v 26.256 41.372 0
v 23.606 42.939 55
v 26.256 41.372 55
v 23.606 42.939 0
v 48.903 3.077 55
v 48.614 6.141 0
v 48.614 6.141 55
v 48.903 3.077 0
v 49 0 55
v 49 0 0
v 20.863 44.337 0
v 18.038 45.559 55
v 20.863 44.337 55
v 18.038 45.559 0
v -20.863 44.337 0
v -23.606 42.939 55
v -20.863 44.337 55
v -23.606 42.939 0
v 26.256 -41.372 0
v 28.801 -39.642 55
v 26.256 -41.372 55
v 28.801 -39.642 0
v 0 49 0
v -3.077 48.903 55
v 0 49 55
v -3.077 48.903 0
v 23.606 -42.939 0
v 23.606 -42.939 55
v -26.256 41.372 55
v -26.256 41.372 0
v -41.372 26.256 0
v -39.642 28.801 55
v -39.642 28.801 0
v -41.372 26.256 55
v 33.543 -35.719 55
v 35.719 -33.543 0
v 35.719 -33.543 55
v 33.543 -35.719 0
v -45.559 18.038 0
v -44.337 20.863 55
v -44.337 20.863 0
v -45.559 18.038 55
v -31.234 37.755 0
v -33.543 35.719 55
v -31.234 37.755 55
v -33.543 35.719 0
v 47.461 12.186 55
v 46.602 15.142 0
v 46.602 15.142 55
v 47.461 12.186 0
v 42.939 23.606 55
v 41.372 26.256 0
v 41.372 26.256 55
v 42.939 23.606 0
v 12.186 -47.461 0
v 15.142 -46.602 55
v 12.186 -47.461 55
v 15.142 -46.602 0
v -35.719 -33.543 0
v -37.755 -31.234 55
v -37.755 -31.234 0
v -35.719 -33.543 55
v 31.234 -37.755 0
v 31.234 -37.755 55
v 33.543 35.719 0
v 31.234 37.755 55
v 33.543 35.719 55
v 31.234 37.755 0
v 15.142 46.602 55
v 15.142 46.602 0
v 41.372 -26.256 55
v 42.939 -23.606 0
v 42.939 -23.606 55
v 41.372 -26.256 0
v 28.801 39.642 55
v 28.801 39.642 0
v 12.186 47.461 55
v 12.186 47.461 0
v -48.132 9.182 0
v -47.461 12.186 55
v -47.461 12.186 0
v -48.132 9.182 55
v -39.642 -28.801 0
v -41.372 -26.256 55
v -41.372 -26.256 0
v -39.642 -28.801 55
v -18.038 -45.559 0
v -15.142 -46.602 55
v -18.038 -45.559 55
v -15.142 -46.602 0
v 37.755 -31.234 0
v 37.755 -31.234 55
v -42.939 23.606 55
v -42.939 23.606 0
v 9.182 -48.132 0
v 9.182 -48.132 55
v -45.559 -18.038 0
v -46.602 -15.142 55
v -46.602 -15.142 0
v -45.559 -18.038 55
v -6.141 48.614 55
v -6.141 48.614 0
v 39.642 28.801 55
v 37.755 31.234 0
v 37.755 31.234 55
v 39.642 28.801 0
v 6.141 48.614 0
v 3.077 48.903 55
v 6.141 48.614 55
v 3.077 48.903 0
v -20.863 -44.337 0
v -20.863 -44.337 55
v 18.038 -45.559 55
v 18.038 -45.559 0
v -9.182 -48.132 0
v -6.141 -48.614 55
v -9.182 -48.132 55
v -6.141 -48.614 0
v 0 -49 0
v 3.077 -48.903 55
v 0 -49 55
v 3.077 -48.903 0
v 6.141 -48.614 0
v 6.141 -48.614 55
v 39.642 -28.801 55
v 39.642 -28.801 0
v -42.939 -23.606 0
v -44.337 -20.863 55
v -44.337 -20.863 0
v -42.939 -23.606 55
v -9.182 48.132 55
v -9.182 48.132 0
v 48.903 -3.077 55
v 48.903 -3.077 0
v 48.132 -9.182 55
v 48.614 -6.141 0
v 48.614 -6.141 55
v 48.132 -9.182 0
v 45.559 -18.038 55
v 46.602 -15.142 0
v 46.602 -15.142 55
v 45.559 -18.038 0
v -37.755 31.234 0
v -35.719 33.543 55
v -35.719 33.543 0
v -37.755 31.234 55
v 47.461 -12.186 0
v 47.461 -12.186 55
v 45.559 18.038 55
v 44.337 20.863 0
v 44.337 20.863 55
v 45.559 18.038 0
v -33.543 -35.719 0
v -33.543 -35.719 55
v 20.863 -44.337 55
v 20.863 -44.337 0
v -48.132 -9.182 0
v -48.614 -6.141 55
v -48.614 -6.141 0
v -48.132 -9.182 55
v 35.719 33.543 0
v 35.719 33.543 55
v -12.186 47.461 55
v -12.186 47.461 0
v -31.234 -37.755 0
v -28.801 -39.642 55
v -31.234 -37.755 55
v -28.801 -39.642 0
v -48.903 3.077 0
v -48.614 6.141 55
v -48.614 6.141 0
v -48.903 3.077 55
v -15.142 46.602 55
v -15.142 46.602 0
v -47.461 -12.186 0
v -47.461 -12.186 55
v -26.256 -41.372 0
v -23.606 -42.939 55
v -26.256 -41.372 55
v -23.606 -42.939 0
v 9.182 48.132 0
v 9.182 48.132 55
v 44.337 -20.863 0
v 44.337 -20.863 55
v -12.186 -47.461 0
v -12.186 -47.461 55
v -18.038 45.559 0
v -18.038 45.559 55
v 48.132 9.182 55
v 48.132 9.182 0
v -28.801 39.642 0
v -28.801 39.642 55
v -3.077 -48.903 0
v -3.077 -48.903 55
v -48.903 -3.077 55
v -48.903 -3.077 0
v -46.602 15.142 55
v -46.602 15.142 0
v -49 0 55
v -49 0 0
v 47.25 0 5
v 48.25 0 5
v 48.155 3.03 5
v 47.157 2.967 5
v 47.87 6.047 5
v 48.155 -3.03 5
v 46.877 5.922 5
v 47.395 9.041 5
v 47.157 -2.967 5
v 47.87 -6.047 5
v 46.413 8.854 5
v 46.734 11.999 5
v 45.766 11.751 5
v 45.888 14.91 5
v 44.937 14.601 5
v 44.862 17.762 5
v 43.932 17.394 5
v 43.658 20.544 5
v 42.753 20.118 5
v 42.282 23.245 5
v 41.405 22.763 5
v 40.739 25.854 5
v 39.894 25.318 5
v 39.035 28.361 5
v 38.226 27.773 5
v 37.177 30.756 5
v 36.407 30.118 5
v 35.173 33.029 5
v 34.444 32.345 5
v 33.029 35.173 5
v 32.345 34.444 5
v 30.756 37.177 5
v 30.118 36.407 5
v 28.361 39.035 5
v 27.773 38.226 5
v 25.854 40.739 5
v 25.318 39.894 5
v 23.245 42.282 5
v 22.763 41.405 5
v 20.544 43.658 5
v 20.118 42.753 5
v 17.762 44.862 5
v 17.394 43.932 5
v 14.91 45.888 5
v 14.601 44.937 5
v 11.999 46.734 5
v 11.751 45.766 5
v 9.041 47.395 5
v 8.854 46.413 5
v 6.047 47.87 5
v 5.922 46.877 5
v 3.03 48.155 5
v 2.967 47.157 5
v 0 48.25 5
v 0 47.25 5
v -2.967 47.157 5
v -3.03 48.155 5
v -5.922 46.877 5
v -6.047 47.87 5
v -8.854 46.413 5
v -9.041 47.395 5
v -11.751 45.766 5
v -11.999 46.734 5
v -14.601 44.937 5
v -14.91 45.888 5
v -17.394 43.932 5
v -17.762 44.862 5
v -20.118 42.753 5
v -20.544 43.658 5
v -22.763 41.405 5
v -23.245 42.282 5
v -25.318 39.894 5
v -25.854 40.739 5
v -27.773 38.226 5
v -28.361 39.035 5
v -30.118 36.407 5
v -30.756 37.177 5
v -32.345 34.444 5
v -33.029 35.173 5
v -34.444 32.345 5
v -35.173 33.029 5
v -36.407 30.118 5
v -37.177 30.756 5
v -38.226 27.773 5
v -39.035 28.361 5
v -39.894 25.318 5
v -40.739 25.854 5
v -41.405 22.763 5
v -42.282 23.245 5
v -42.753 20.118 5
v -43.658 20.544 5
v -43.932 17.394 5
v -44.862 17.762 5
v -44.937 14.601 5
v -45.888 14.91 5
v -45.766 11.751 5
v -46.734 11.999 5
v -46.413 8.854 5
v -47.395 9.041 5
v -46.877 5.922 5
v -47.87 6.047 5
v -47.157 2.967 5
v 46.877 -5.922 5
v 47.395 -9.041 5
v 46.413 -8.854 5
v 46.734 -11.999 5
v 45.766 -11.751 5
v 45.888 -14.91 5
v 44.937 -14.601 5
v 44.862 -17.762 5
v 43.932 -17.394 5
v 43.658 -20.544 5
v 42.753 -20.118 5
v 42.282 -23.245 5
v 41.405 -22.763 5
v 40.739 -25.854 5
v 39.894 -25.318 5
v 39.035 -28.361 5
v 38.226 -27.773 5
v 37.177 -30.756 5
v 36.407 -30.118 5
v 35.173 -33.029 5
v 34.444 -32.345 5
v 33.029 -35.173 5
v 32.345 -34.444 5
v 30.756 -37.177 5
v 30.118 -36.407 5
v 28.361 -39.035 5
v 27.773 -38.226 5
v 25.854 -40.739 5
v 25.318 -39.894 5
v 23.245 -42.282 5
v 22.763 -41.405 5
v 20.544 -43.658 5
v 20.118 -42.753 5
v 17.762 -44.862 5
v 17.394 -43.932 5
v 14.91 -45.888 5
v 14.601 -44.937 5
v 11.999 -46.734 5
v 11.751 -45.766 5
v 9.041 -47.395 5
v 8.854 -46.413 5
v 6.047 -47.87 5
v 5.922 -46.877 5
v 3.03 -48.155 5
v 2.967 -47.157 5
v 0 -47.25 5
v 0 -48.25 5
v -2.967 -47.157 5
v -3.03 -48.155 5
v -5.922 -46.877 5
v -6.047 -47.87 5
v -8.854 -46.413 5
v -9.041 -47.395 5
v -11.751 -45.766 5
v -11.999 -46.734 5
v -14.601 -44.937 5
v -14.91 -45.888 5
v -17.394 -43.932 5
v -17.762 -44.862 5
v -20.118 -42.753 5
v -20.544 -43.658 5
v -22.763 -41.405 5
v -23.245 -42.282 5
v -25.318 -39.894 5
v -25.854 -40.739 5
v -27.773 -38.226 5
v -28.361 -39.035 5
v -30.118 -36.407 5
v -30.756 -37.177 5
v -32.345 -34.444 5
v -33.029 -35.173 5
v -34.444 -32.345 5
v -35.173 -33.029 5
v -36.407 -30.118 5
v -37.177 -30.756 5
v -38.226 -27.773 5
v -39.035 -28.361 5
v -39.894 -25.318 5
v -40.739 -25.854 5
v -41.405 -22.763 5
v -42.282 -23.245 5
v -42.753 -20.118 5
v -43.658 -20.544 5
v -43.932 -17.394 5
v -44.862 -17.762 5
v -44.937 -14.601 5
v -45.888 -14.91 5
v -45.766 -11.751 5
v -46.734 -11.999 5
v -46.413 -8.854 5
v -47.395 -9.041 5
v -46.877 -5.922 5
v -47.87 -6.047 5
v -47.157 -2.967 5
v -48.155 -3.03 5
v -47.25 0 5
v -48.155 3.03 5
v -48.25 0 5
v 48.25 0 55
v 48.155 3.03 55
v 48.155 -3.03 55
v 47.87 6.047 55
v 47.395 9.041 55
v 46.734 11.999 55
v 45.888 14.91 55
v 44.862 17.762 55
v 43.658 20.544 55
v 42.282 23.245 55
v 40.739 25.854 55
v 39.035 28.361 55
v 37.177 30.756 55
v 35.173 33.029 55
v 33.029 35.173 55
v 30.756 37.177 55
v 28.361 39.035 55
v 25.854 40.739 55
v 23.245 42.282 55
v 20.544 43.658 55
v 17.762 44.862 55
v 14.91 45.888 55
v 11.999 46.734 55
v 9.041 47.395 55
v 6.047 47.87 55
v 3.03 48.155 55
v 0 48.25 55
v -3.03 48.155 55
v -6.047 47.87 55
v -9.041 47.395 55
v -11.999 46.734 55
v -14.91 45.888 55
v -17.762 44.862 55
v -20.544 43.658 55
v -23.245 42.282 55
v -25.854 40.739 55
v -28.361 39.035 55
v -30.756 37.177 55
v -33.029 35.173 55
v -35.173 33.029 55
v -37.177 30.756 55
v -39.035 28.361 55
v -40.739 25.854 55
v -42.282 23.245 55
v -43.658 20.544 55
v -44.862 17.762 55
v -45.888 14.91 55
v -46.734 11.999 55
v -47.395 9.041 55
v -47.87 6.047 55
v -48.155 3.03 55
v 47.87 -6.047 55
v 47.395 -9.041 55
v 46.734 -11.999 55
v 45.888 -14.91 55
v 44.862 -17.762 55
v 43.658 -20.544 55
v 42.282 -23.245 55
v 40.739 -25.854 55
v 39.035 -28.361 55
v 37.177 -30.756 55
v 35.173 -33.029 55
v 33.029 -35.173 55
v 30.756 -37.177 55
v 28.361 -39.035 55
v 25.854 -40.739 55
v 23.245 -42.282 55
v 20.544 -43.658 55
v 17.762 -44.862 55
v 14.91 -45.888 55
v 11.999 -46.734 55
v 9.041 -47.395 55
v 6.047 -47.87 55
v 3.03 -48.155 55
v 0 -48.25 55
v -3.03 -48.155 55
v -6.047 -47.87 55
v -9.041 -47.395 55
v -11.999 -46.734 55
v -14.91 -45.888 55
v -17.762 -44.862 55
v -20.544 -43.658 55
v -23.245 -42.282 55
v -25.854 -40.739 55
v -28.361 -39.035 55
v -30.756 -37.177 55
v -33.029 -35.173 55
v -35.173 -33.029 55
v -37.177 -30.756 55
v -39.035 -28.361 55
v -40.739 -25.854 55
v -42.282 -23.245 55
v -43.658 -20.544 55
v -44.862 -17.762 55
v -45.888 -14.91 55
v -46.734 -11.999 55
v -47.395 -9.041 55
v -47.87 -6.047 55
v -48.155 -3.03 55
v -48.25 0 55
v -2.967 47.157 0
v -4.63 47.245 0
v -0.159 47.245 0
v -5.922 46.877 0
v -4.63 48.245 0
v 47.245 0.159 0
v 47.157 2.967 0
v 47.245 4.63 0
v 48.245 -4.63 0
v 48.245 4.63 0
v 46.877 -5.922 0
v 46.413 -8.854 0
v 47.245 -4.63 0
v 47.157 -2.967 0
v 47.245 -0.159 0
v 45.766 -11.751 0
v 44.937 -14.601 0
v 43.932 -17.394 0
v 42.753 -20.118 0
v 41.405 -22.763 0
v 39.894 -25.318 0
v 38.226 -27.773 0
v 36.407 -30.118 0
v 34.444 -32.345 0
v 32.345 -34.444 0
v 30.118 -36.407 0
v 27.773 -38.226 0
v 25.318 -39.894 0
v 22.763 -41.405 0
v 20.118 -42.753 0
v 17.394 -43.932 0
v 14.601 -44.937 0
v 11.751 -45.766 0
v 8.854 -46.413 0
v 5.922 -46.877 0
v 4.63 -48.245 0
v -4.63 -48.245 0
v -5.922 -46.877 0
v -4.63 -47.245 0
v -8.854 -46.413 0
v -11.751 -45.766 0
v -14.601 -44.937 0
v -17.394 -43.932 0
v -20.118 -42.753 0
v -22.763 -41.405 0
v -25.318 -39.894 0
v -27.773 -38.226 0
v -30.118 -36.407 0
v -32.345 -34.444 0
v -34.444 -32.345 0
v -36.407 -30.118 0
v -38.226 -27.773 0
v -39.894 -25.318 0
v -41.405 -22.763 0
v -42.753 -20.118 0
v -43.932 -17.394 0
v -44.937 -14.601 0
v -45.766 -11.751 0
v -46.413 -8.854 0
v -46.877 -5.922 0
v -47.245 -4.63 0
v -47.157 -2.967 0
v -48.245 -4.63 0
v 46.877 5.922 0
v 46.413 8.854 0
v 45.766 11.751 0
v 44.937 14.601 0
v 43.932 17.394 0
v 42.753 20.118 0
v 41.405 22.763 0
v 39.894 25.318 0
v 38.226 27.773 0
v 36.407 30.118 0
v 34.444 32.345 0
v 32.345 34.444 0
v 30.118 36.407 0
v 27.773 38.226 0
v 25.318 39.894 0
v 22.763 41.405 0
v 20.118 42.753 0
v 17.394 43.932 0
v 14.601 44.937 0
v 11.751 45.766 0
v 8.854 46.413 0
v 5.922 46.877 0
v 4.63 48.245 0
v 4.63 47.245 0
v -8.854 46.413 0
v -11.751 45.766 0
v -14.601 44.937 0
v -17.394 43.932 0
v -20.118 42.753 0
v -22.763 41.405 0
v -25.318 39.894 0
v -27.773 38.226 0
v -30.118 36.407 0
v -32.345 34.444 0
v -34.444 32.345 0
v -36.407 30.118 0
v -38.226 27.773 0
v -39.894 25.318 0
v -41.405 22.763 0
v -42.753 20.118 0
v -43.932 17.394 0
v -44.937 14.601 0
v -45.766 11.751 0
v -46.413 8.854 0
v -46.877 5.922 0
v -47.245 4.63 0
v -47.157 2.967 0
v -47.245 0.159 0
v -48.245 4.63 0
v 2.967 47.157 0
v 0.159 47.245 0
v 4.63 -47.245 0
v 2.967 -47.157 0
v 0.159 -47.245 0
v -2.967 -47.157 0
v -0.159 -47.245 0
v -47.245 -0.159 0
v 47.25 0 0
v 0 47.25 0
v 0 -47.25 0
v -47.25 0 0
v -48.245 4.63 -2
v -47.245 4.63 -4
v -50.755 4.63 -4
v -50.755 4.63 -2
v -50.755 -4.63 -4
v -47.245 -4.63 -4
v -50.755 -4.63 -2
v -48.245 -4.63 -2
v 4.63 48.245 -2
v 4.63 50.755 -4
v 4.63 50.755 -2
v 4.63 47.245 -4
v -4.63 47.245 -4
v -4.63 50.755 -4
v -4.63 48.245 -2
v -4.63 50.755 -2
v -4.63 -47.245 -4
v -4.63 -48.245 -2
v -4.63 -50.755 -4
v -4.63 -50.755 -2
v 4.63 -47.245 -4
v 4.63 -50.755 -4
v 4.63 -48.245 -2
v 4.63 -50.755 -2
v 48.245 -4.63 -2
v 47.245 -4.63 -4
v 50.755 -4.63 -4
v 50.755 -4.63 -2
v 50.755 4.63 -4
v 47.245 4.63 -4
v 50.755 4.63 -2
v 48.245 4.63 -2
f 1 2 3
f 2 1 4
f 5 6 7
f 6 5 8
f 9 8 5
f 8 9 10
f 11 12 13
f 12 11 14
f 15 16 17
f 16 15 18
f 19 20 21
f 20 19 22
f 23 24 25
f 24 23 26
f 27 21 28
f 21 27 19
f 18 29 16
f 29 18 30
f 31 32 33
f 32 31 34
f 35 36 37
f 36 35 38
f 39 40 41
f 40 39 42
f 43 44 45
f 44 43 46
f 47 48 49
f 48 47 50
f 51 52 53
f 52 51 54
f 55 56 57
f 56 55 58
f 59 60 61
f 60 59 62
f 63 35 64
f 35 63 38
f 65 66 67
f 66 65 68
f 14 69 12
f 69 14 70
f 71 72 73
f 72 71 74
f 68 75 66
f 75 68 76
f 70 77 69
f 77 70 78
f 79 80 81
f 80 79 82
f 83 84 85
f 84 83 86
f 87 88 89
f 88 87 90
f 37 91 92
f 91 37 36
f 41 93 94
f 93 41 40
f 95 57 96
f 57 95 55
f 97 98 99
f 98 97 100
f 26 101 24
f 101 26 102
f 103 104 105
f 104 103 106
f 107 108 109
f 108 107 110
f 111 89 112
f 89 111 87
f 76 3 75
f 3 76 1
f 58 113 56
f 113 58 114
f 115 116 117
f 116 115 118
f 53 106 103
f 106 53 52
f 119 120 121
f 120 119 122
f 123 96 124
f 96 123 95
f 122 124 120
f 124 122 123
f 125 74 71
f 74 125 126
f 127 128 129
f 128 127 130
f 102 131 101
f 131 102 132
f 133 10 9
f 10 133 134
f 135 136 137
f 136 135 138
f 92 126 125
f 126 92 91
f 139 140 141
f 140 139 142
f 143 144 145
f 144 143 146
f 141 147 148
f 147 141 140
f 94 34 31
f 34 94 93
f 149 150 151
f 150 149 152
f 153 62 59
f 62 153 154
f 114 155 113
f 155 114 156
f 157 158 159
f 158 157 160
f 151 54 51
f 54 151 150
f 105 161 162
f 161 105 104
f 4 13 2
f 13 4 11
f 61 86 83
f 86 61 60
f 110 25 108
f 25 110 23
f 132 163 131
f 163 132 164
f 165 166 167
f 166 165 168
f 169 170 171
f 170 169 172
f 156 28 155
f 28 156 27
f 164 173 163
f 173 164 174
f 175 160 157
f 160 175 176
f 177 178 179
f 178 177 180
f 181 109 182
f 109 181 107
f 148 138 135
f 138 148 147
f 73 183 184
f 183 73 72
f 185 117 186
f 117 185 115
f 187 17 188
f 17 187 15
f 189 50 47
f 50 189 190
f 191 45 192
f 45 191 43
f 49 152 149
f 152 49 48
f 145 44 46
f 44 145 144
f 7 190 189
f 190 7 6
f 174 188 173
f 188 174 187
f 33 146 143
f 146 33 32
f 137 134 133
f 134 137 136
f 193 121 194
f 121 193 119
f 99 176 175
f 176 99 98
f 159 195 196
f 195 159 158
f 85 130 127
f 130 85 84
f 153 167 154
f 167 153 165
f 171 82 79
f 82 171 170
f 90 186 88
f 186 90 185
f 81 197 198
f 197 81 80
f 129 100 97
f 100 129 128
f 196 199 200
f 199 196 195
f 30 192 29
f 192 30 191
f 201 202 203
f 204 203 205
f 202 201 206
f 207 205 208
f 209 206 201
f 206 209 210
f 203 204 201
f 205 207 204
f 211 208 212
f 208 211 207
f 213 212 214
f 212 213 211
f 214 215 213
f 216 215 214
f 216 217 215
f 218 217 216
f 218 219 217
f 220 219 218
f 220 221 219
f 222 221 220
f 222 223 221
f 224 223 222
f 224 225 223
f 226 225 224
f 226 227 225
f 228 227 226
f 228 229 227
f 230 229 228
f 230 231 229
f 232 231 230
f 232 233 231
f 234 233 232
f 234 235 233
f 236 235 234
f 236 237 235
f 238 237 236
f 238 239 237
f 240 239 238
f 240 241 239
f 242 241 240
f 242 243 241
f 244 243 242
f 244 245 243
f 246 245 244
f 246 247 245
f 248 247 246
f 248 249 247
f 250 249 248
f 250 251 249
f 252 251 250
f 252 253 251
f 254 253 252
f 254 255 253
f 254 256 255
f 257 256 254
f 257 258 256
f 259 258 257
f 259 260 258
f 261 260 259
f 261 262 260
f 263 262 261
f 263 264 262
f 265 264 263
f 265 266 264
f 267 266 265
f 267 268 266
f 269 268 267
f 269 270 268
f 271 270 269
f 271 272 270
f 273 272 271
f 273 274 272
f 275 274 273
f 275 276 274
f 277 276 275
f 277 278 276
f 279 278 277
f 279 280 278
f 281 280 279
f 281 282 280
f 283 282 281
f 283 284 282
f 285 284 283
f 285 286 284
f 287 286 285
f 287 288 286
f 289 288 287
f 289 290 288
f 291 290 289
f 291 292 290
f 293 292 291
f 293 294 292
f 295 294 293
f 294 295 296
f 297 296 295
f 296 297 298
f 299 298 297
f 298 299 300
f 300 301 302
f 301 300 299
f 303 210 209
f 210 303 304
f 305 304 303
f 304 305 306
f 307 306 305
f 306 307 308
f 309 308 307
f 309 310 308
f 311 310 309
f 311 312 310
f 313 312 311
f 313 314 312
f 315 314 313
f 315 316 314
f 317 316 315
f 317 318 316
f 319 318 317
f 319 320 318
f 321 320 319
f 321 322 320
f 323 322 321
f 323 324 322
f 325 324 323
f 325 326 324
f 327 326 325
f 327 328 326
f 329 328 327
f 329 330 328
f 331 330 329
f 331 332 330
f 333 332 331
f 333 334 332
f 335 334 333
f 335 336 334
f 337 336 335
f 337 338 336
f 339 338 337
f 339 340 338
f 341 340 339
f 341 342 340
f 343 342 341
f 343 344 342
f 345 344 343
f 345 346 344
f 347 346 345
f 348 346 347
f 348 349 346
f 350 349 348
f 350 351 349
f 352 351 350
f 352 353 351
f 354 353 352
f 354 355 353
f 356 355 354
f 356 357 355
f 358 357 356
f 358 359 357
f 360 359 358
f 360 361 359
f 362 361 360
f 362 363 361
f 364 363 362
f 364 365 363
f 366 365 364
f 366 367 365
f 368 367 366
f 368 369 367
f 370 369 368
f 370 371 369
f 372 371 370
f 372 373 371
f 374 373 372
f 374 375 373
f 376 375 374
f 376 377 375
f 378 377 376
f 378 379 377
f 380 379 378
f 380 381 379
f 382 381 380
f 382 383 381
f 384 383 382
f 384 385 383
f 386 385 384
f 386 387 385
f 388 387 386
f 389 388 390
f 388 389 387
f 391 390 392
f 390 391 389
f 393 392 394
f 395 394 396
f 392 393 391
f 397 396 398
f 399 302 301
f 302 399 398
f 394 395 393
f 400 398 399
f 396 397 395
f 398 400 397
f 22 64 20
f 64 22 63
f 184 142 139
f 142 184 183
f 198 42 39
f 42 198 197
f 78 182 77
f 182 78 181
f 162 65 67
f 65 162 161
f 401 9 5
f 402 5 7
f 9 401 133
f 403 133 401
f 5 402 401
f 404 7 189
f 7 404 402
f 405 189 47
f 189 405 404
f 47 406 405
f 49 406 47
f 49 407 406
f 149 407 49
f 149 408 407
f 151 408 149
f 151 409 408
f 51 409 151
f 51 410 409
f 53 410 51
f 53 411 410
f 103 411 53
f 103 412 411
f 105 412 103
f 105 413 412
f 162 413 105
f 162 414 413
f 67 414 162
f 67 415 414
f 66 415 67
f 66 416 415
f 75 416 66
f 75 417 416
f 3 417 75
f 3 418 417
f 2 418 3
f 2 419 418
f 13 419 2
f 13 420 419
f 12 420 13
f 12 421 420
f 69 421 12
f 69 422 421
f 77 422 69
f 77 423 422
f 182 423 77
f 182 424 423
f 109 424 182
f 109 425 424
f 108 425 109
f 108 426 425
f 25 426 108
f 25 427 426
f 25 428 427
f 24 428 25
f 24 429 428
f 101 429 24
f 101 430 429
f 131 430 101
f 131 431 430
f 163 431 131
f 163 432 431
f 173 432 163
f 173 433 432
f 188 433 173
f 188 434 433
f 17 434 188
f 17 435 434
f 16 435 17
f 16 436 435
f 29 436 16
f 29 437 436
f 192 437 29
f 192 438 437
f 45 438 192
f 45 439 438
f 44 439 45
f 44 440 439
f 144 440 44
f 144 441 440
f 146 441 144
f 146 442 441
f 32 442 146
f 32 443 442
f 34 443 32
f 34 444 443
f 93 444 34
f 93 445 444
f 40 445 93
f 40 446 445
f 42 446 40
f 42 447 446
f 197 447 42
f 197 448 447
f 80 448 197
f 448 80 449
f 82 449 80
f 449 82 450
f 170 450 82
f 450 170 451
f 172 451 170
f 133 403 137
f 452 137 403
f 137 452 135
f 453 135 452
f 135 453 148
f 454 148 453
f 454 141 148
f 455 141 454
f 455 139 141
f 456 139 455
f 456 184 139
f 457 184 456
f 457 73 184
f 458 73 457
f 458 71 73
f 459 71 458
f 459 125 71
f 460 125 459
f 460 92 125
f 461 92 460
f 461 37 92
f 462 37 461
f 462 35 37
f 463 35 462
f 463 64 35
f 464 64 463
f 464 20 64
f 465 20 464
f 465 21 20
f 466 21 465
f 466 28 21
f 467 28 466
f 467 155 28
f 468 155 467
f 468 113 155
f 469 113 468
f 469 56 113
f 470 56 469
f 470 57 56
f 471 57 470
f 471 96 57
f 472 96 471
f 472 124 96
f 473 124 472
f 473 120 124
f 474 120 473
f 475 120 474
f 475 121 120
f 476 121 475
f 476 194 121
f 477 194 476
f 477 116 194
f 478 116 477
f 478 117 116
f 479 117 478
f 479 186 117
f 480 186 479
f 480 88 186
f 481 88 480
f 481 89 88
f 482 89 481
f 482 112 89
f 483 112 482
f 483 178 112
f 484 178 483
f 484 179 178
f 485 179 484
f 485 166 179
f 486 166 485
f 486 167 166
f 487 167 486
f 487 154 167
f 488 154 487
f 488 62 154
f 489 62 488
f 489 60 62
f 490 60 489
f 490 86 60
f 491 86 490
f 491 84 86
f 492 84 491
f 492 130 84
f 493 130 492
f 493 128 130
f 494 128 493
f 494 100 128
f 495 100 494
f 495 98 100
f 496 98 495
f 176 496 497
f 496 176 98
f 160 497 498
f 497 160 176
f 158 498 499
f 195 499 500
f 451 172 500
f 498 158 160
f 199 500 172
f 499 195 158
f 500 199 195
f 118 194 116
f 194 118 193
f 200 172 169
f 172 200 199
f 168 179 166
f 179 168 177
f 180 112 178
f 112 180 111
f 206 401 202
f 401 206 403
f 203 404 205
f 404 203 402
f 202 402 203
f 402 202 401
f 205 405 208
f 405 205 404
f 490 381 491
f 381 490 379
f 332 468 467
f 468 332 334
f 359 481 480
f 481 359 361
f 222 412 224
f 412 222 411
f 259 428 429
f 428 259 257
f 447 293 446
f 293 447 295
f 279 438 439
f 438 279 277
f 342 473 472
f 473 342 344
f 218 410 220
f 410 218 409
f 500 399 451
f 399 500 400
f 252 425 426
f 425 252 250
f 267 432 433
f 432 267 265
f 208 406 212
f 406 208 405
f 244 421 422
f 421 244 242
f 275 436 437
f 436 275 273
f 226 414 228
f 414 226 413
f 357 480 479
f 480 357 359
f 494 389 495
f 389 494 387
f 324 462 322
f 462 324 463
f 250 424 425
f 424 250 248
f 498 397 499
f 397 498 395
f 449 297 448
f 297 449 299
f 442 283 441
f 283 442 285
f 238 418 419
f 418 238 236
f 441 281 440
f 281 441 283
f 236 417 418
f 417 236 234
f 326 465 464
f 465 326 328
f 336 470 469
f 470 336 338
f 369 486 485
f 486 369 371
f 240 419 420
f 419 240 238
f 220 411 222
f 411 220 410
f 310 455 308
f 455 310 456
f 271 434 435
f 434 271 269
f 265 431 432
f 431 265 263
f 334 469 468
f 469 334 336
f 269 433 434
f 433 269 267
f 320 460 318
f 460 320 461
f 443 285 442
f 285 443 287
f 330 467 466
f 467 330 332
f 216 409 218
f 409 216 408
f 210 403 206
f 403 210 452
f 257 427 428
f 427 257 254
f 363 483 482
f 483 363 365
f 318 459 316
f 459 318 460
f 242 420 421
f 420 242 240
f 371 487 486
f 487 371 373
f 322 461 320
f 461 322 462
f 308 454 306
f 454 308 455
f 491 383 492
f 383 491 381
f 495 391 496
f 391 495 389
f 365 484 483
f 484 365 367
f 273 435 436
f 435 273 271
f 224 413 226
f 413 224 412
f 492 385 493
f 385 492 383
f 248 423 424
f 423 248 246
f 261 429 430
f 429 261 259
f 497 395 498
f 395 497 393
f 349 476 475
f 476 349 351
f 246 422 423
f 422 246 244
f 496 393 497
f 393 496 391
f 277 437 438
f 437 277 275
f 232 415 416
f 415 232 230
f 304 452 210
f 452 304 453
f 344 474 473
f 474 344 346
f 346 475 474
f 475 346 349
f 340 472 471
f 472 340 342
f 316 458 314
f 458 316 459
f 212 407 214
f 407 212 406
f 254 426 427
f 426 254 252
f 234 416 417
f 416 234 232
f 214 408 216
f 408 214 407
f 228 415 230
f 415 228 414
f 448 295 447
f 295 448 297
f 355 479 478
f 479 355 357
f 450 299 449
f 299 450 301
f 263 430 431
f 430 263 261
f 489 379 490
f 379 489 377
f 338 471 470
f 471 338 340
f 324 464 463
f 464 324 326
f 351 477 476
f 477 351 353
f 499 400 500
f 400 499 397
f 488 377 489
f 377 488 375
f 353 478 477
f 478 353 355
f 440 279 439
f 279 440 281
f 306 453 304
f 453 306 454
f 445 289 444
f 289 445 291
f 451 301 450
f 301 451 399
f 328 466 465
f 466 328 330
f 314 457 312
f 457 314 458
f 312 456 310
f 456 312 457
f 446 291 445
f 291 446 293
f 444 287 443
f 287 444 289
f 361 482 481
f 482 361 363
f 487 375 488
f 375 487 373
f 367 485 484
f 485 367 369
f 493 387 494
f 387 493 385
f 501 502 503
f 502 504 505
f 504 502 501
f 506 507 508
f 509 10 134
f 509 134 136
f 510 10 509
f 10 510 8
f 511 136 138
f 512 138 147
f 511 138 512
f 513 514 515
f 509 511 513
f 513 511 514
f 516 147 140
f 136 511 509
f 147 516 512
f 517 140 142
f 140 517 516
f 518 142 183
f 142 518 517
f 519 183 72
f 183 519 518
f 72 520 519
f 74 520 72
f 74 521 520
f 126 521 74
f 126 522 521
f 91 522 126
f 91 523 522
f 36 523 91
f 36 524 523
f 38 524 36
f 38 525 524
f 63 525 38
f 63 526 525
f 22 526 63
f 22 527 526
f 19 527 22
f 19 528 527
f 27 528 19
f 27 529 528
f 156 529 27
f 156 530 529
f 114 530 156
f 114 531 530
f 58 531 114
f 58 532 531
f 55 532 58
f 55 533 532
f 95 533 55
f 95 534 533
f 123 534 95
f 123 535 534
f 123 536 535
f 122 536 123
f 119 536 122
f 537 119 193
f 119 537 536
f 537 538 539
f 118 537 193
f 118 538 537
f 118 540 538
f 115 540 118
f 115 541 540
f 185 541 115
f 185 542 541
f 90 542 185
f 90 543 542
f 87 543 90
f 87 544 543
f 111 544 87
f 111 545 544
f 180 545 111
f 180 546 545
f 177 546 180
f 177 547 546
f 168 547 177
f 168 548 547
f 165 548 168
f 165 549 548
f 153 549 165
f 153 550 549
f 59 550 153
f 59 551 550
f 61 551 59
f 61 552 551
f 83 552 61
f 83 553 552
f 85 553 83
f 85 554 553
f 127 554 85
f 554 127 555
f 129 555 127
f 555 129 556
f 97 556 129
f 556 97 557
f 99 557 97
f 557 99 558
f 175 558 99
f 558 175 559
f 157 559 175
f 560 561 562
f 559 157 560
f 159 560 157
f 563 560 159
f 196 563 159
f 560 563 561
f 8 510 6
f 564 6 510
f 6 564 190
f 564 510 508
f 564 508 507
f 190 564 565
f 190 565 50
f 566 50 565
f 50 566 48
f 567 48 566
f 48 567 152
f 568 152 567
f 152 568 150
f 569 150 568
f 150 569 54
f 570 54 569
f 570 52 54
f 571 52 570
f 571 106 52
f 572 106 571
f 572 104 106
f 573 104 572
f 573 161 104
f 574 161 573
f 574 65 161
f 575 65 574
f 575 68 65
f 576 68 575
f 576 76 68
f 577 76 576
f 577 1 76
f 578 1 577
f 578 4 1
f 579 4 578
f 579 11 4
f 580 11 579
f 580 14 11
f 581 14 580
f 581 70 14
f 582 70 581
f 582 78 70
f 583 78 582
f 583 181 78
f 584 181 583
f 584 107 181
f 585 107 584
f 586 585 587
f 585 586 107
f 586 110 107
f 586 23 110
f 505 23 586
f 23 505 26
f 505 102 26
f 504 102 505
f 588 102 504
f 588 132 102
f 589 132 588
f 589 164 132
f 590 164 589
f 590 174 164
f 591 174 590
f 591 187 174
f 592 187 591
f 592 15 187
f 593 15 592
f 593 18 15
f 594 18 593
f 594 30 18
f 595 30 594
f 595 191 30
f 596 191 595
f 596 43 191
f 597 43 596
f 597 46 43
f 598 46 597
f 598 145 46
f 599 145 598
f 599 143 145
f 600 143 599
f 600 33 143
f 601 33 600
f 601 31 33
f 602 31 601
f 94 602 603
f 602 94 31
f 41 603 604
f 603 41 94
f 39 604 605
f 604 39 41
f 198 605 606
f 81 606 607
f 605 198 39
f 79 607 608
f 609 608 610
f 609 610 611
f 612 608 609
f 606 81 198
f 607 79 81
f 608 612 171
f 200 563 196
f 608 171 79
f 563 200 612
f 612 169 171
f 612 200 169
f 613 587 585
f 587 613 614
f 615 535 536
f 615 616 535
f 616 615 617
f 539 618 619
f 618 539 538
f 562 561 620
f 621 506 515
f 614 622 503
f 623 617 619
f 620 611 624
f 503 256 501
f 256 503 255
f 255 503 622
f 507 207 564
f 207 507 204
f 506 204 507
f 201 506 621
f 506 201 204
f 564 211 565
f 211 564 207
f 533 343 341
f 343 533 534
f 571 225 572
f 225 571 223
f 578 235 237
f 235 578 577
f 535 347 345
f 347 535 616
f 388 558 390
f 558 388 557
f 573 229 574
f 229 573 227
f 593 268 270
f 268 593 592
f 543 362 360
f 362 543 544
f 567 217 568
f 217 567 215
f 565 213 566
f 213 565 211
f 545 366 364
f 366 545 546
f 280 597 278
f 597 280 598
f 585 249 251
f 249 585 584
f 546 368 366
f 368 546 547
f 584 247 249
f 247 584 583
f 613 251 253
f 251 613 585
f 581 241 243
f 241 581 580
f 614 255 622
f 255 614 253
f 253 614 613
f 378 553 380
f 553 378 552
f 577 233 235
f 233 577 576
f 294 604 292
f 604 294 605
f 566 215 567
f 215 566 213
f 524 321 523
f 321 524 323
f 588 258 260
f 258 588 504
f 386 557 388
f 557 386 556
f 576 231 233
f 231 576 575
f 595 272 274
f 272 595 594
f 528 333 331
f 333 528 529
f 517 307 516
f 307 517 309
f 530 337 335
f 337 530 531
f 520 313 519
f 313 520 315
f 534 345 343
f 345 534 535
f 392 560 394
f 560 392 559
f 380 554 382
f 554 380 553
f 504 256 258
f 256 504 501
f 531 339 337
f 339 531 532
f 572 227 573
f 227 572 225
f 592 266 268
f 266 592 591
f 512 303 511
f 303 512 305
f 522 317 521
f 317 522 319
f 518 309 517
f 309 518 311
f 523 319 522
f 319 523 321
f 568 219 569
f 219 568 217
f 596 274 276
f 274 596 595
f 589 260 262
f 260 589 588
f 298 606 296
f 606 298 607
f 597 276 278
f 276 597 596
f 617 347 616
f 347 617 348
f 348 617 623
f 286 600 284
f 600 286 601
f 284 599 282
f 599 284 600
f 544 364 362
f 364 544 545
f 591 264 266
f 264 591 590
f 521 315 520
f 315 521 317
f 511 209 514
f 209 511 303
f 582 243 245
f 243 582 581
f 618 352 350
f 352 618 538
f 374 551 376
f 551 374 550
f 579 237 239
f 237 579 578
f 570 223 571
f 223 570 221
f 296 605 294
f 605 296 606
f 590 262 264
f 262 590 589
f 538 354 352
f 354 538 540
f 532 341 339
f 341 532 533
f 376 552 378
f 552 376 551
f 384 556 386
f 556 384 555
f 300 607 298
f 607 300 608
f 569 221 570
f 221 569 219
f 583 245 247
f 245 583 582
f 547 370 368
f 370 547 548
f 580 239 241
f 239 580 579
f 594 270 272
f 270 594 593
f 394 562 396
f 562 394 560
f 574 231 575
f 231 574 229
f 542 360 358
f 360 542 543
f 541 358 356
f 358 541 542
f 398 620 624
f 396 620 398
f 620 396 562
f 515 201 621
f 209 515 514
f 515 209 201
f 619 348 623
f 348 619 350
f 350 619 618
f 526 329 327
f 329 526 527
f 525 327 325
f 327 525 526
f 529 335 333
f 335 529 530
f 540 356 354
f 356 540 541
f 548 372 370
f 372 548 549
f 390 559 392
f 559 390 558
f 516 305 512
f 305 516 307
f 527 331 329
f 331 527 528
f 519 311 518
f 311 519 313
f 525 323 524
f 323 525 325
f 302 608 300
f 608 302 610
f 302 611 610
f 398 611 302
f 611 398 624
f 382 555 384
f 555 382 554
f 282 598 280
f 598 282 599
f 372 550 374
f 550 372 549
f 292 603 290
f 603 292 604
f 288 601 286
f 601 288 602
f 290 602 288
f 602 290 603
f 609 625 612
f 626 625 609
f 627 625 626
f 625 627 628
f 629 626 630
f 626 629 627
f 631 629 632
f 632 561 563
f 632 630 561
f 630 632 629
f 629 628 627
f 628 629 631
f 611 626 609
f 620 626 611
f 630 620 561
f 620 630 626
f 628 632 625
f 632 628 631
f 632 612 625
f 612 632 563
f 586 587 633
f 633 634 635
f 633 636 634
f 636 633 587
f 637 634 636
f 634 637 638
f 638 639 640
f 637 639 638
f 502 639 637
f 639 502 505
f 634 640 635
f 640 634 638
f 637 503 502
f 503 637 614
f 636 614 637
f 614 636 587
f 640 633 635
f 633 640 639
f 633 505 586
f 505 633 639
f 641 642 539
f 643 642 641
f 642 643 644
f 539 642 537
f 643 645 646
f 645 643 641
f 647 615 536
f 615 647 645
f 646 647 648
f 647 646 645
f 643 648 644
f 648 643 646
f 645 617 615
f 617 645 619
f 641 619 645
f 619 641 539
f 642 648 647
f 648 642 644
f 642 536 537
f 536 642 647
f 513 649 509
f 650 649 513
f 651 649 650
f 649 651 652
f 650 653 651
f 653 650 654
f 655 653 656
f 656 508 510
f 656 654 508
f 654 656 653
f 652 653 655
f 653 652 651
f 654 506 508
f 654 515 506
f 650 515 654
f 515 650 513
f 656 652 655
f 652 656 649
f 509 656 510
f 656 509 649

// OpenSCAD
//linear_extrude(height =20)
Diameter=98;
Height=50;
Thick=1.5;

HubDiameter=Diameter;
HubHeight=5;
HubThick=3.5;
LockRadius=49.0;
$fn=100;
Shade(1);
for (a=[0:30:360]){
// echo(a)
//lock(a,LockRadius,3.51,3.5,-.5);
};
//lock(100,LockRadius,3.51,4);

module lock(Rot,OffSet,SizeX,SizeY,AdjZ){
    translate([0,0,AdjZ]){
        rotate([0,0,Rot]){
            translate([0,OffSet,-(SizeY/2)]){
                difference(){
                cube([9.26,SizeX,SizeY],true);
                    translate([0,1,SizeY/2]){    
                        cube([9.26,SizeX,SizeY],true);
                    }
                }
            }
        }
    }
}
module lock2(Rot,OffSet,SizeX,SizeY){
    rotate([0,0,Rot]){
        translate([0,OffSet,-2]){
            difference(){
            cube([9.26,SizeX,SizeY],true);
                translate([0,1,SizeY/2]){    
                    cube([9.26,SizeX,SizeY],true);
                }
            }
        }
    }
}
module Shade(go) {
rotate([0,0,0]){
union(){
translate([0,0,HubHeight]){
    Tube(Diameter,Height,Thick);
}
union(){
union(){
union(){
union(){
    Tube(HubDiameter,HubHeight,HubThick);
    lock(90,LockRadius,3.51,4);
}
lock(0,LockRadius,3.51,4);
}
lock(180,LockRadius,3.51,4);
}
lock(270,LockRadius,3.51,4);
}
}
}
}

module lock1(Rot,OffSet){
    rotate([0,0,Rot]){
        translate([0,OffSet,-2]){
            difference(){
            cube([9.26,4.11,4],true);
                translate([0,1,2]){    
                    cube([9.26,4.11,4],true);
                }
            }
        }
    }
}
module Tube(Diameter,Height,Thick) {
    difference(){
        cylinder(d=Diameter,h=Height);
        cylinder(d=(Diameter-Thick),h=Height);
    }
}
